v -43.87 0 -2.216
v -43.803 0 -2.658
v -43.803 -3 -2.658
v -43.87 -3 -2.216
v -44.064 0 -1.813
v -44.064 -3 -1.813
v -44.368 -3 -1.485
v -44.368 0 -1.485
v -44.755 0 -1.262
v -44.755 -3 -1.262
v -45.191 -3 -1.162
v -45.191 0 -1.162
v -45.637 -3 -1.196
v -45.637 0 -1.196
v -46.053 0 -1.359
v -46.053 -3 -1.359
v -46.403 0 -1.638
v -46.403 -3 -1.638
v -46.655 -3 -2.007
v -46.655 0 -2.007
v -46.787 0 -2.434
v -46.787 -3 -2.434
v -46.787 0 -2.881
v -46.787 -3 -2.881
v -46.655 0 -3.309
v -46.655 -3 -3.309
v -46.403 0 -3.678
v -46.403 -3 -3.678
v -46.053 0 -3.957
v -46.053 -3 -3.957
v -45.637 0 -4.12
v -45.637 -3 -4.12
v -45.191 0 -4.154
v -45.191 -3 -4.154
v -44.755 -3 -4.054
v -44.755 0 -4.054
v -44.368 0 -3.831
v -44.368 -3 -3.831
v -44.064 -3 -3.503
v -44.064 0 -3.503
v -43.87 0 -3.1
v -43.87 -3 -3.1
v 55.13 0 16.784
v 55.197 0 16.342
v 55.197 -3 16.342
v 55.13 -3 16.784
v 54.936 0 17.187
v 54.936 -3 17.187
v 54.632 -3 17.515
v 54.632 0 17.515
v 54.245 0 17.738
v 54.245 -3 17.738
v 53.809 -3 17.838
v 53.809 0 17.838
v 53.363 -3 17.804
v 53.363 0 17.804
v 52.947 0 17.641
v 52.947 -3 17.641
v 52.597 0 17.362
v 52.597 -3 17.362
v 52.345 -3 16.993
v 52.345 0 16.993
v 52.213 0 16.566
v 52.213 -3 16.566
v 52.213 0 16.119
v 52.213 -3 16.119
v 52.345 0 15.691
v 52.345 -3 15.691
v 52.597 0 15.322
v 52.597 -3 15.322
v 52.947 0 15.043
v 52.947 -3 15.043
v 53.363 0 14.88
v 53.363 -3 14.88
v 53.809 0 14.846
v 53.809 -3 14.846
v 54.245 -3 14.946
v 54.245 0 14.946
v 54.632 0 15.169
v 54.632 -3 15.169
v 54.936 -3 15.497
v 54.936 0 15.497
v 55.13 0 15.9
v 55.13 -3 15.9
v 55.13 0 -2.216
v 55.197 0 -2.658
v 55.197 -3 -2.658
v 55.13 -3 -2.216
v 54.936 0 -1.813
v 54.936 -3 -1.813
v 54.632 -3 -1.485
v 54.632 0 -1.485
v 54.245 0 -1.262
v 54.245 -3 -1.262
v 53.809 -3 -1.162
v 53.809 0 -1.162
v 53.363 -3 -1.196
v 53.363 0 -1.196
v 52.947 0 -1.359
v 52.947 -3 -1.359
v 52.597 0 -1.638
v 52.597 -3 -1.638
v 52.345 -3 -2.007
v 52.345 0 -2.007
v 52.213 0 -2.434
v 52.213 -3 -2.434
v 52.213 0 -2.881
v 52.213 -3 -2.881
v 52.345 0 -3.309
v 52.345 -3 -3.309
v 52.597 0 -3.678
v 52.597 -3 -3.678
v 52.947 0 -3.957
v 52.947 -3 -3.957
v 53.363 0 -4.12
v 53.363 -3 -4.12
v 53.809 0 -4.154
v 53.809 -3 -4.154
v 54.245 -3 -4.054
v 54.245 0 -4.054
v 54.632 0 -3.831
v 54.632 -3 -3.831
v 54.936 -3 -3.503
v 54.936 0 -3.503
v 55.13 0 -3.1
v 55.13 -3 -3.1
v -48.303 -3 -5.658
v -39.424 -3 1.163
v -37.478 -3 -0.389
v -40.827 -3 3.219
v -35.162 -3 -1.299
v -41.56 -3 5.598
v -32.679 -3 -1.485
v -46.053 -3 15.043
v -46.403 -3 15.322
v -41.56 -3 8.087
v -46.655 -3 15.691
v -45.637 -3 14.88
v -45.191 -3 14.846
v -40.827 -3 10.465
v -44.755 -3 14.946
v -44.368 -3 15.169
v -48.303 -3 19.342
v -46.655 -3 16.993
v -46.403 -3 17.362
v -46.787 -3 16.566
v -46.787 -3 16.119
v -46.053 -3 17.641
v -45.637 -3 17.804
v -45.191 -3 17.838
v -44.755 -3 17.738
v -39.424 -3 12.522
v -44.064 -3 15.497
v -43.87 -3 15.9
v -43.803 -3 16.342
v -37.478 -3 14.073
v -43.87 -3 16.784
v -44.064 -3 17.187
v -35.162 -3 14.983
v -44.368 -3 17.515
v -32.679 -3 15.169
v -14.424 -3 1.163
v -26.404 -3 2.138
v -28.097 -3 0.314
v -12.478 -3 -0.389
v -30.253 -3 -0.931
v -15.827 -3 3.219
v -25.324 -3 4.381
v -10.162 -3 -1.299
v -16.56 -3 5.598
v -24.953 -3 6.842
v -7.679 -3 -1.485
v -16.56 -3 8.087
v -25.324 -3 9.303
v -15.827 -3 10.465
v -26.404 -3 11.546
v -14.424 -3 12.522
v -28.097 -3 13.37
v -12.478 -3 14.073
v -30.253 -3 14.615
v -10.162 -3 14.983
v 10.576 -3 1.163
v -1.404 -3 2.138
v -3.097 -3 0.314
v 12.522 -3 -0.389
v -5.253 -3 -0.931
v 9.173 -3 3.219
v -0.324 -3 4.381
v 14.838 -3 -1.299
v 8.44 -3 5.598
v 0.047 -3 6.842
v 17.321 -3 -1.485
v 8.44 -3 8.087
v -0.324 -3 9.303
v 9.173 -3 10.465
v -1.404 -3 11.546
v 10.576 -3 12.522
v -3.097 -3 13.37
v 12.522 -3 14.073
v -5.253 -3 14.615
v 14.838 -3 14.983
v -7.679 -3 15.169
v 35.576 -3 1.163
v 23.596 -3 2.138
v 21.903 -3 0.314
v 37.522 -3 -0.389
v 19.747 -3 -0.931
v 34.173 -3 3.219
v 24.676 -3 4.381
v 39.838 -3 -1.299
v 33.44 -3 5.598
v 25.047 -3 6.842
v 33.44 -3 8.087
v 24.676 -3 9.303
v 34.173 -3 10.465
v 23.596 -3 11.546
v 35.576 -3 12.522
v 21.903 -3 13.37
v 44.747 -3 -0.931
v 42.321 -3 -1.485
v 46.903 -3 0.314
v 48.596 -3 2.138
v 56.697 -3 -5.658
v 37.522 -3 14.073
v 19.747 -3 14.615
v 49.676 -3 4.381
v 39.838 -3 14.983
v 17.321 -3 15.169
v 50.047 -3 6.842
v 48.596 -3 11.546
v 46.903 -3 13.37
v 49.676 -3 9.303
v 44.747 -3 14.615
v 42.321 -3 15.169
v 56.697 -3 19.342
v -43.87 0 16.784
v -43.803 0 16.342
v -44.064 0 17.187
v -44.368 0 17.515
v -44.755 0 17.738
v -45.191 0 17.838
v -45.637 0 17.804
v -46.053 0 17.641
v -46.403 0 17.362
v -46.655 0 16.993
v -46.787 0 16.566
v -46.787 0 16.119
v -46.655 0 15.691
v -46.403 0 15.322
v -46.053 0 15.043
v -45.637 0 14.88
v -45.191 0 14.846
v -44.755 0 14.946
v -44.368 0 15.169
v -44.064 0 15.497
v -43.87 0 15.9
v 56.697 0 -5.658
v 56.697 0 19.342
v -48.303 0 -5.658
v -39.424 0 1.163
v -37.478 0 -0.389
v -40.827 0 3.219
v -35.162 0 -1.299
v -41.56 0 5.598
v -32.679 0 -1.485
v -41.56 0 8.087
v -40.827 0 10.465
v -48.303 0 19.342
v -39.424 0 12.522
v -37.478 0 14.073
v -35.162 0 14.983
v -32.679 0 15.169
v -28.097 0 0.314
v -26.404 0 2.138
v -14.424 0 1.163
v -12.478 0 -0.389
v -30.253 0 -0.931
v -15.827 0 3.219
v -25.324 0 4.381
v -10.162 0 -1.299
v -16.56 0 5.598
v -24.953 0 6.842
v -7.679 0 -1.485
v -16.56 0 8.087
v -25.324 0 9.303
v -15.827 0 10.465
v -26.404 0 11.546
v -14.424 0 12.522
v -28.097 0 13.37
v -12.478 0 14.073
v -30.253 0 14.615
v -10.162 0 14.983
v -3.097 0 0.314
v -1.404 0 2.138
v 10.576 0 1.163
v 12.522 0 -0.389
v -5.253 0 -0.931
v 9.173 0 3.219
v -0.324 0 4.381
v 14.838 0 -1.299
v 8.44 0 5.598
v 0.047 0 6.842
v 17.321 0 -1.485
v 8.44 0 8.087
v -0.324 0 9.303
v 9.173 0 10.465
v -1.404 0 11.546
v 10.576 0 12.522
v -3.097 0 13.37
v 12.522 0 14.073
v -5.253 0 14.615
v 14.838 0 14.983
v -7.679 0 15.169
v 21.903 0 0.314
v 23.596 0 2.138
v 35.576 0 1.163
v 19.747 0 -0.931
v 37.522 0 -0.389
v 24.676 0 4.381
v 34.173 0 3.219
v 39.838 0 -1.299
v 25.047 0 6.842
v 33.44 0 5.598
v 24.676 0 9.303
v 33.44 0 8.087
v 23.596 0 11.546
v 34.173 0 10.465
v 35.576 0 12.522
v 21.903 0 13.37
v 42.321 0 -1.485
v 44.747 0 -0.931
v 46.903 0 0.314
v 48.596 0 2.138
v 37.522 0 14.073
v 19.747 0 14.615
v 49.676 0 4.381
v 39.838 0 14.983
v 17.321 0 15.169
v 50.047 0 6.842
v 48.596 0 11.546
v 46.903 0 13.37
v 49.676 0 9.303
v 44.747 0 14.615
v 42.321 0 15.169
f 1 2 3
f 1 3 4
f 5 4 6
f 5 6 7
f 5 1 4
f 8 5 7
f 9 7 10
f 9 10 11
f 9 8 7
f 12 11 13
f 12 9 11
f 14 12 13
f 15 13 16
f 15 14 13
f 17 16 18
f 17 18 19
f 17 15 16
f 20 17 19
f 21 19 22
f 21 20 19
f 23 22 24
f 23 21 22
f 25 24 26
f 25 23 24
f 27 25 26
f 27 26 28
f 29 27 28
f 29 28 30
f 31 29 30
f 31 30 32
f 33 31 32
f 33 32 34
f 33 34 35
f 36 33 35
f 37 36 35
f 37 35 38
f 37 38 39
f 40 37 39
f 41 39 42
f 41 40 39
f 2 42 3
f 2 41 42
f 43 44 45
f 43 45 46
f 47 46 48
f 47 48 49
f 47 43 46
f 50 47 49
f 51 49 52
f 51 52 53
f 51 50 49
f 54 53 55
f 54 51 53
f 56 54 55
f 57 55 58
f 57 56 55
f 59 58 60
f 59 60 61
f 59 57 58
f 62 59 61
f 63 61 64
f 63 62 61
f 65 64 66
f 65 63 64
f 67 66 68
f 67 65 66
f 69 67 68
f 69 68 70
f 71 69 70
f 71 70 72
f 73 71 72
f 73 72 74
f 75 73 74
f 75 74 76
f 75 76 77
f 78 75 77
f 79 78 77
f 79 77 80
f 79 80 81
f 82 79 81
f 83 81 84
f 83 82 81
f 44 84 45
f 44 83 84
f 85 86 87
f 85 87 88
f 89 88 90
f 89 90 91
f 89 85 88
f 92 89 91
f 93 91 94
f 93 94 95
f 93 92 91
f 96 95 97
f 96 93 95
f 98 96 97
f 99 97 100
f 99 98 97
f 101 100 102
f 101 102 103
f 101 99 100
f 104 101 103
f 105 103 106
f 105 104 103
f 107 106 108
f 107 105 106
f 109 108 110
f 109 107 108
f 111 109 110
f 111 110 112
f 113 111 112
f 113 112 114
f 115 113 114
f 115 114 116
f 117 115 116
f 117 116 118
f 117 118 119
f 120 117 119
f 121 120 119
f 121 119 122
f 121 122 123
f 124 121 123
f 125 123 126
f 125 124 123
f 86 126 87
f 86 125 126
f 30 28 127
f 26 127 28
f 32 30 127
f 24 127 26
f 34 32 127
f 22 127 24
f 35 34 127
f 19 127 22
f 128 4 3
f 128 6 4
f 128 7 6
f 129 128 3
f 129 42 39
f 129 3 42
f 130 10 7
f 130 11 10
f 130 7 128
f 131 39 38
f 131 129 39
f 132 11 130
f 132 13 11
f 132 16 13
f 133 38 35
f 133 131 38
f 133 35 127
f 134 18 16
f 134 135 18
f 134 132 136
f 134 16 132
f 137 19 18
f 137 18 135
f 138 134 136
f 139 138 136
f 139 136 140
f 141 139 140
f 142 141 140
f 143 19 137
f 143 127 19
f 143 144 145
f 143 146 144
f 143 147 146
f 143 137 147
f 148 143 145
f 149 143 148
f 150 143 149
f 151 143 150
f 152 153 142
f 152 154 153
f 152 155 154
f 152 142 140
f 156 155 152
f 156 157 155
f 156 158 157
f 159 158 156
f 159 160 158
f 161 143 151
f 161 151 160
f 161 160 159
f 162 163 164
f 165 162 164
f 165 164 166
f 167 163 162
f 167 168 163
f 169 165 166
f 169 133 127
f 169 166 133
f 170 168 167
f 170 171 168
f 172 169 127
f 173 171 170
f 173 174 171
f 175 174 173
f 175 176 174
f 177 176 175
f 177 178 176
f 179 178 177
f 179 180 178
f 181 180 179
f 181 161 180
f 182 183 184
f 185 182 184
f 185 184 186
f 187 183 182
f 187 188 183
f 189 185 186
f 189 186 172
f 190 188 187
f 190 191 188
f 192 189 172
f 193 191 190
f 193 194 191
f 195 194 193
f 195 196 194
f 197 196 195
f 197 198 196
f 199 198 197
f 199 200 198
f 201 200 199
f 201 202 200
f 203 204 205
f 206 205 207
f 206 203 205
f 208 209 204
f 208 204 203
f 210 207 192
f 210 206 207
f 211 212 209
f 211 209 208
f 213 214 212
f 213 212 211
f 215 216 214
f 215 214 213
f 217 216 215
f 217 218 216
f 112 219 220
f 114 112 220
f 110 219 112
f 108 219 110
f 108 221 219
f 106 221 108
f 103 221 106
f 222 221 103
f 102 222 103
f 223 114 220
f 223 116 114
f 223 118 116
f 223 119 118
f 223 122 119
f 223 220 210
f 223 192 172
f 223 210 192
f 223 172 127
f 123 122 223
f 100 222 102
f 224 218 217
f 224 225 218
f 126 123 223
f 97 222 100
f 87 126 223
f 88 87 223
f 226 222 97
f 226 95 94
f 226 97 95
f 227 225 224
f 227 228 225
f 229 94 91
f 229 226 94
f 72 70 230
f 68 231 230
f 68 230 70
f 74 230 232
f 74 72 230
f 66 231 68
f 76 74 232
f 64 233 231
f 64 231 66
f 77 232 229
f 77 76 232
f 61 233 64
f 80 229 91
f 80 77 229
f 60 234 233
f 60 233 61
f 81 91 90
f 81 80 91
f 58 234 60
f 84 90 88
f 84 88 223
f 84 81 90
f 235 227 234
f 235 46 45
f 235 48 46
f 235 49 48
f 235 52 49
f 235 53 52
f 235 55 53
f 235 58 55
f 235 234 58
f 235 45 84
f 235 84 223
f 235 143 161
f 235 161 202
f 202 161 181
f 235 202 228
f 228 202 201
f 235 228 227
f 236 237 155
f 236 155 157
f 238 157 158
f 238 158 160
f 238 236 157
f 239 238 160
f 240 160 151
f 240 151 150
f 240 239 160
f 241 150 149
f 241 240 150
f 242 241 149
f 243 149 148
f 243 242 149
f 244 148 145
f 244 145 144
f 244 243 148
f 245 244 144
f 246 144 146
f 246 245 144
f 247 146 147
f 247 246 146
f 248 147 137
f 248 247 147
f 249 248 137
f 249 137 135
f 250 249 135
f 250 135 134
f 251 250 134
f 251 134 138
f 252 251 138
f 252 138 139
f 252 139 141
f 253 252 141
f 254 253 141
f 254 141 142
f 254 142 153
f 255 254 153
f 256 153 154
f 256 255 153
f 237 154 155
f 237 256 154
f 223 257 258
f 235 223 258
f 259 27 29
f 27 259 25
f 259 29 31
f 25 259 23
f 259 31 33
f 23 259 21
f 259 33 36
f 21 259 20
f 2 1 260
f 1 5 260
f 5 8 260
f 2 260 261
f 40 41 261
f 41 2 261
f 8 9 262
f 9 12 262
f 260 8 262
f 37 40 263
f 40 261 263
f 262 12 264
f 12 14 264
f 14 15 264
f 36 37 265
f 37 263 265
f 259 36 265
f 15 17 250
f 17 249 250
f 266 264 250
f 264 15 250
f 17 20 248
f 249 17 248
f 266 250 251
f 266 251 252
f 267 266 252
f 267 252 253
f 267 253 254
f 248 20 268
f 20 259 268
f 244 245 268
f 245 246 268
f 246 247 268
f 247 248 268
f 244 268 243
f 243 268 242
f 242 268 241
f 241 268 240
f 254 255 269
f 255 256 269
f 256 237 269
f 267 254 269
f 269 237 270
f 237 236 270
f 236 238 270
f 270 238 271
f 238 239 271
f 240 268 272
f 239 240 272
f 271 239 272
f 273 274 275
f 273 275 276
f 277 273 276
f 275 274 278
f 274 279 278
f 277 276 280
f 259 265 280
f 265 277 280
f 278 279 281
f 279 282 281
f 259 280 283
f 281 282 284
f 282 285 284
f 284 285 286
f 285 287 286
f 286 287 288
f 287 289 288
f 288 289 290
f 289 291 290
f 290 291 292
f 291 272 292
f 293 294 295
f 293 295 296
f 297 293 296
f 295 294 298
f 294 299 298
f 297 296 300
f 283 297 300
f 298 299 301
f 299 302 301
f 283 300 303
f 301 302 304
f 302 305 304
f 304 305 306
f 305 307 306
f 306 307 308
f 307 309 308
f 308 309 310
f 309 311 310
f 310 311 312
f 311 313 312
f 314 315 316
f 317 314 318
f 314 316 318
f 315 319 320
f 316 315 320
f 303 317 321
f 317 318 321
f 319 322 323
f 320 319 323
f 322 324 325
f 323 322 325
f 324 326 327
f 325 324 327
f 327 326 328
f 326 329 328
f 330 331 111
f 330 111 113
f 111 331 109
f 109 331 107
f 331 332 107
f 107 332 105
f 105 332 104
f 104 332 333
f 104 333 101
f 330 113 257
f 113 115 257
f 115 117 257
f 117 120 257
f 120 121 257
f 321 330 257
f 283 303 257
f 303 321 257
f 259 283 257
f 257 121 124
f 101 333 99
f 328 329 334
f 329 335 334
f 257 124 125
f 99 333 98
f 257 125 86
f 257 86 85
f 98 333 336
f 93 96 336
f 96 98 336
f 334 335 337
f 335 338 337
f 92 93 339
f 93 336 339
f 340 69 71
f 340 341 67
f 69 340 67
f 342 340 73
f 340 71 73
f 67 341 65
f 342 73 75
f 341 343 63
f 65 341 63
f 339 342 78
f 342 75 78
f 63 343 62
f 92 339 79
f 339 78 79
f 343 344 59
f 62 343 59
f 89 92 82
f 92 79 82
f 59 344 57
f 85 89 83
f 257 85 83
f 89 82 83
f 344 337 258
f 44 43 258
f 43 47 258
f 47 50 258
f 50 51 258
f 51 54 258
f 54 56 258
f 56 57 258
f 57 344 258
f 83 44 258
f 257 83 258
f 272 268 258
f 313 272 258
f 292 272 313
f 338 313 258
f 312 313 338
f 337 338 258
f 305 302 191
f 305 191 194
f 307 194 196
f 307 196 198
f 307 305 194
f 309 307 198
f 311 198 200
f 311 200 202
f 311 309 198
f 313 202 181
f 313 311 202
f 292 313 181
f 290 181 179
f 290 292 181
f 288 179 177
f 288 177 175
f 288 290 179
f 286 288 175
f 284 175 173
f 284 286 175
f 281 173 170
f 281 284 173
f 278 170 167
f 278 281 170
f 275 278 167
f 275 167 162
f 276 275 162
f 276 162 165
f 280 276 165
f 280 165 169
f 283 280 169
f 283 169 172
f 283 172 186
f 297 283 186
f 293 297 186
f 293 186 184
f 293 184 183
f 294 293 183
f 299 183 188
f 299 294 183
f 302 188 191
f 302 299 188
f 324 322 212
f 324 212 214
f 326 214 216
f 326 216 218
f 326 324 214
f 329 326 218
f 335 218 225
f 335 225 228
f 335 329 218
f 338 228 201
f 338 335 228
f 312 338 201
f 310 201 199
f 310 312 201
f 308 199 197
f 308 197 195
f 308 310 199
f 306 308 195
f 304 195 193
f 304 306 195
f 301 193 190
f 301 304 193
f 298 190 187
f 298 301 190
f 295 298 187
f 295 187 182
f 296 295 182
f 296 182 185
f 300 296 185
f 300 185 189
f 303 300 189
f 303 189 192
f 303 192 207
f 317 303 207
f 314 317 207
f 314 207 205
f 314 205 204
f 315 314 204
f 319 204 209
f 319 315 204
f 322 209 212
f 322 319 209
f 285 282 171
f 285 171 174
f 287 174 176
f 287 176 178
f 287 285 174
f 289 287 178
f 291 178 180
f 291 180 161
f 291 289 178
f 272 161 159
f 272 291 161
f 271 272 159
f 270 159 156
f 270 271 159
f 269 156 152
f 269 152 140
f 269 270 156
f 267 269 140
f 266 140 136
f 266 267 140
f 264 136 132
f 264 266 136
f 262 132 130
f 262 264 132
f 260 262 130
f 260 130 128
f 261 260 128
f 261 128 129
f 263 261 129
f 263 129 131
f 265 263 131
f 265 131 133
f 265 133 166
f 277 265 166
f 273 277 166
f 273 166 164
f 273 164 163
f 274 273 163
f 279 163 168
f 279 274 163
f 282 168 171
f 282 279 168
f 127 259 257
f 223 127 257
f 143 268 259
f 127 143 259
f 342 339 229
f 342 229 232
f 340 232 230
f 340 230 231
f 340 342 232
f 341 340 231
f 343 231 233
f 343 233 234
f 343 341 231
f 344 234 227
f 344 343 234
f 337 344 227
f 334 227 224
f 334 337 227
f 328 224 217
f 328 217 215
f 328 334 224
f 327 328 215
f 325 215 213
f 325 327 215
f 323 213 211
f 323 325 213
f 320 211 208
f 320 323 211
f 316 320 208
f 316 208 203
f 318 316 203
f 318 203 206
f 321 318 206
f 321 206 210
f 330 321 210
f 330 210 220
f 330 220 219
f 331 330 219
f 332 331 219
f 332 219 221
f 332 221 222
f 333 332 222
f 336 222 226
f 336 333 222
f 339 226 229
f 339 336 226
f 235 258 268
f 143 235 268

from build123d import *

# Parameters (mm, degrees)
F0_R     = 1.5
F0_R_2   = 8.35
F1_DEPTH = 3


with BuildPart() as f1:
    # F0 (on Front) → F1 (new body)
    with BuildSketch(Plane.XZ):
        Polygon((-48.303484, 6.842105), (-48.303484, -5.657895), (56.696516, -5.657895), (56.696516, 6.842105), (56.696516, 19.342105), (-48.303484, 19.342105), align=None)
        with Locations((-45.303484, -2.657895)):
            Circle(F0_R, mode=Mode.SUBTRACT)
        with Locations((-33.303484, 6.842105)):
            Circle(F0_R_2, mode=Mode.SUBTRACT)
        with Locations((-8.303484, 6.842105)):
            Circle(F0_R_2, mode=Mode.SUBTRACT)
        with Locations((53.696516, -2.657895)):
            Circle(F0_R, mode=Mode.SUBTRACT)
        with Locations((16.696516, 6.842105)):
            Circle(F0_R_2, mode=Mode.SUBTRACT)
        with Locations((41.696516, 6.842105)):
            Circle(F0_R_2, mode=Mode.SUBTRACT)
        with Locations((-45.303484, 16.342105)):
            Circle(F0_R, mode=Mode.SUBTRACT)
        with Locations((53.696516, 16.342105)):
            Circle(F0_R, mode=Mode.SUBTRACT)
    extrude(amount=F1_DEPTH)


solid = f1.part
